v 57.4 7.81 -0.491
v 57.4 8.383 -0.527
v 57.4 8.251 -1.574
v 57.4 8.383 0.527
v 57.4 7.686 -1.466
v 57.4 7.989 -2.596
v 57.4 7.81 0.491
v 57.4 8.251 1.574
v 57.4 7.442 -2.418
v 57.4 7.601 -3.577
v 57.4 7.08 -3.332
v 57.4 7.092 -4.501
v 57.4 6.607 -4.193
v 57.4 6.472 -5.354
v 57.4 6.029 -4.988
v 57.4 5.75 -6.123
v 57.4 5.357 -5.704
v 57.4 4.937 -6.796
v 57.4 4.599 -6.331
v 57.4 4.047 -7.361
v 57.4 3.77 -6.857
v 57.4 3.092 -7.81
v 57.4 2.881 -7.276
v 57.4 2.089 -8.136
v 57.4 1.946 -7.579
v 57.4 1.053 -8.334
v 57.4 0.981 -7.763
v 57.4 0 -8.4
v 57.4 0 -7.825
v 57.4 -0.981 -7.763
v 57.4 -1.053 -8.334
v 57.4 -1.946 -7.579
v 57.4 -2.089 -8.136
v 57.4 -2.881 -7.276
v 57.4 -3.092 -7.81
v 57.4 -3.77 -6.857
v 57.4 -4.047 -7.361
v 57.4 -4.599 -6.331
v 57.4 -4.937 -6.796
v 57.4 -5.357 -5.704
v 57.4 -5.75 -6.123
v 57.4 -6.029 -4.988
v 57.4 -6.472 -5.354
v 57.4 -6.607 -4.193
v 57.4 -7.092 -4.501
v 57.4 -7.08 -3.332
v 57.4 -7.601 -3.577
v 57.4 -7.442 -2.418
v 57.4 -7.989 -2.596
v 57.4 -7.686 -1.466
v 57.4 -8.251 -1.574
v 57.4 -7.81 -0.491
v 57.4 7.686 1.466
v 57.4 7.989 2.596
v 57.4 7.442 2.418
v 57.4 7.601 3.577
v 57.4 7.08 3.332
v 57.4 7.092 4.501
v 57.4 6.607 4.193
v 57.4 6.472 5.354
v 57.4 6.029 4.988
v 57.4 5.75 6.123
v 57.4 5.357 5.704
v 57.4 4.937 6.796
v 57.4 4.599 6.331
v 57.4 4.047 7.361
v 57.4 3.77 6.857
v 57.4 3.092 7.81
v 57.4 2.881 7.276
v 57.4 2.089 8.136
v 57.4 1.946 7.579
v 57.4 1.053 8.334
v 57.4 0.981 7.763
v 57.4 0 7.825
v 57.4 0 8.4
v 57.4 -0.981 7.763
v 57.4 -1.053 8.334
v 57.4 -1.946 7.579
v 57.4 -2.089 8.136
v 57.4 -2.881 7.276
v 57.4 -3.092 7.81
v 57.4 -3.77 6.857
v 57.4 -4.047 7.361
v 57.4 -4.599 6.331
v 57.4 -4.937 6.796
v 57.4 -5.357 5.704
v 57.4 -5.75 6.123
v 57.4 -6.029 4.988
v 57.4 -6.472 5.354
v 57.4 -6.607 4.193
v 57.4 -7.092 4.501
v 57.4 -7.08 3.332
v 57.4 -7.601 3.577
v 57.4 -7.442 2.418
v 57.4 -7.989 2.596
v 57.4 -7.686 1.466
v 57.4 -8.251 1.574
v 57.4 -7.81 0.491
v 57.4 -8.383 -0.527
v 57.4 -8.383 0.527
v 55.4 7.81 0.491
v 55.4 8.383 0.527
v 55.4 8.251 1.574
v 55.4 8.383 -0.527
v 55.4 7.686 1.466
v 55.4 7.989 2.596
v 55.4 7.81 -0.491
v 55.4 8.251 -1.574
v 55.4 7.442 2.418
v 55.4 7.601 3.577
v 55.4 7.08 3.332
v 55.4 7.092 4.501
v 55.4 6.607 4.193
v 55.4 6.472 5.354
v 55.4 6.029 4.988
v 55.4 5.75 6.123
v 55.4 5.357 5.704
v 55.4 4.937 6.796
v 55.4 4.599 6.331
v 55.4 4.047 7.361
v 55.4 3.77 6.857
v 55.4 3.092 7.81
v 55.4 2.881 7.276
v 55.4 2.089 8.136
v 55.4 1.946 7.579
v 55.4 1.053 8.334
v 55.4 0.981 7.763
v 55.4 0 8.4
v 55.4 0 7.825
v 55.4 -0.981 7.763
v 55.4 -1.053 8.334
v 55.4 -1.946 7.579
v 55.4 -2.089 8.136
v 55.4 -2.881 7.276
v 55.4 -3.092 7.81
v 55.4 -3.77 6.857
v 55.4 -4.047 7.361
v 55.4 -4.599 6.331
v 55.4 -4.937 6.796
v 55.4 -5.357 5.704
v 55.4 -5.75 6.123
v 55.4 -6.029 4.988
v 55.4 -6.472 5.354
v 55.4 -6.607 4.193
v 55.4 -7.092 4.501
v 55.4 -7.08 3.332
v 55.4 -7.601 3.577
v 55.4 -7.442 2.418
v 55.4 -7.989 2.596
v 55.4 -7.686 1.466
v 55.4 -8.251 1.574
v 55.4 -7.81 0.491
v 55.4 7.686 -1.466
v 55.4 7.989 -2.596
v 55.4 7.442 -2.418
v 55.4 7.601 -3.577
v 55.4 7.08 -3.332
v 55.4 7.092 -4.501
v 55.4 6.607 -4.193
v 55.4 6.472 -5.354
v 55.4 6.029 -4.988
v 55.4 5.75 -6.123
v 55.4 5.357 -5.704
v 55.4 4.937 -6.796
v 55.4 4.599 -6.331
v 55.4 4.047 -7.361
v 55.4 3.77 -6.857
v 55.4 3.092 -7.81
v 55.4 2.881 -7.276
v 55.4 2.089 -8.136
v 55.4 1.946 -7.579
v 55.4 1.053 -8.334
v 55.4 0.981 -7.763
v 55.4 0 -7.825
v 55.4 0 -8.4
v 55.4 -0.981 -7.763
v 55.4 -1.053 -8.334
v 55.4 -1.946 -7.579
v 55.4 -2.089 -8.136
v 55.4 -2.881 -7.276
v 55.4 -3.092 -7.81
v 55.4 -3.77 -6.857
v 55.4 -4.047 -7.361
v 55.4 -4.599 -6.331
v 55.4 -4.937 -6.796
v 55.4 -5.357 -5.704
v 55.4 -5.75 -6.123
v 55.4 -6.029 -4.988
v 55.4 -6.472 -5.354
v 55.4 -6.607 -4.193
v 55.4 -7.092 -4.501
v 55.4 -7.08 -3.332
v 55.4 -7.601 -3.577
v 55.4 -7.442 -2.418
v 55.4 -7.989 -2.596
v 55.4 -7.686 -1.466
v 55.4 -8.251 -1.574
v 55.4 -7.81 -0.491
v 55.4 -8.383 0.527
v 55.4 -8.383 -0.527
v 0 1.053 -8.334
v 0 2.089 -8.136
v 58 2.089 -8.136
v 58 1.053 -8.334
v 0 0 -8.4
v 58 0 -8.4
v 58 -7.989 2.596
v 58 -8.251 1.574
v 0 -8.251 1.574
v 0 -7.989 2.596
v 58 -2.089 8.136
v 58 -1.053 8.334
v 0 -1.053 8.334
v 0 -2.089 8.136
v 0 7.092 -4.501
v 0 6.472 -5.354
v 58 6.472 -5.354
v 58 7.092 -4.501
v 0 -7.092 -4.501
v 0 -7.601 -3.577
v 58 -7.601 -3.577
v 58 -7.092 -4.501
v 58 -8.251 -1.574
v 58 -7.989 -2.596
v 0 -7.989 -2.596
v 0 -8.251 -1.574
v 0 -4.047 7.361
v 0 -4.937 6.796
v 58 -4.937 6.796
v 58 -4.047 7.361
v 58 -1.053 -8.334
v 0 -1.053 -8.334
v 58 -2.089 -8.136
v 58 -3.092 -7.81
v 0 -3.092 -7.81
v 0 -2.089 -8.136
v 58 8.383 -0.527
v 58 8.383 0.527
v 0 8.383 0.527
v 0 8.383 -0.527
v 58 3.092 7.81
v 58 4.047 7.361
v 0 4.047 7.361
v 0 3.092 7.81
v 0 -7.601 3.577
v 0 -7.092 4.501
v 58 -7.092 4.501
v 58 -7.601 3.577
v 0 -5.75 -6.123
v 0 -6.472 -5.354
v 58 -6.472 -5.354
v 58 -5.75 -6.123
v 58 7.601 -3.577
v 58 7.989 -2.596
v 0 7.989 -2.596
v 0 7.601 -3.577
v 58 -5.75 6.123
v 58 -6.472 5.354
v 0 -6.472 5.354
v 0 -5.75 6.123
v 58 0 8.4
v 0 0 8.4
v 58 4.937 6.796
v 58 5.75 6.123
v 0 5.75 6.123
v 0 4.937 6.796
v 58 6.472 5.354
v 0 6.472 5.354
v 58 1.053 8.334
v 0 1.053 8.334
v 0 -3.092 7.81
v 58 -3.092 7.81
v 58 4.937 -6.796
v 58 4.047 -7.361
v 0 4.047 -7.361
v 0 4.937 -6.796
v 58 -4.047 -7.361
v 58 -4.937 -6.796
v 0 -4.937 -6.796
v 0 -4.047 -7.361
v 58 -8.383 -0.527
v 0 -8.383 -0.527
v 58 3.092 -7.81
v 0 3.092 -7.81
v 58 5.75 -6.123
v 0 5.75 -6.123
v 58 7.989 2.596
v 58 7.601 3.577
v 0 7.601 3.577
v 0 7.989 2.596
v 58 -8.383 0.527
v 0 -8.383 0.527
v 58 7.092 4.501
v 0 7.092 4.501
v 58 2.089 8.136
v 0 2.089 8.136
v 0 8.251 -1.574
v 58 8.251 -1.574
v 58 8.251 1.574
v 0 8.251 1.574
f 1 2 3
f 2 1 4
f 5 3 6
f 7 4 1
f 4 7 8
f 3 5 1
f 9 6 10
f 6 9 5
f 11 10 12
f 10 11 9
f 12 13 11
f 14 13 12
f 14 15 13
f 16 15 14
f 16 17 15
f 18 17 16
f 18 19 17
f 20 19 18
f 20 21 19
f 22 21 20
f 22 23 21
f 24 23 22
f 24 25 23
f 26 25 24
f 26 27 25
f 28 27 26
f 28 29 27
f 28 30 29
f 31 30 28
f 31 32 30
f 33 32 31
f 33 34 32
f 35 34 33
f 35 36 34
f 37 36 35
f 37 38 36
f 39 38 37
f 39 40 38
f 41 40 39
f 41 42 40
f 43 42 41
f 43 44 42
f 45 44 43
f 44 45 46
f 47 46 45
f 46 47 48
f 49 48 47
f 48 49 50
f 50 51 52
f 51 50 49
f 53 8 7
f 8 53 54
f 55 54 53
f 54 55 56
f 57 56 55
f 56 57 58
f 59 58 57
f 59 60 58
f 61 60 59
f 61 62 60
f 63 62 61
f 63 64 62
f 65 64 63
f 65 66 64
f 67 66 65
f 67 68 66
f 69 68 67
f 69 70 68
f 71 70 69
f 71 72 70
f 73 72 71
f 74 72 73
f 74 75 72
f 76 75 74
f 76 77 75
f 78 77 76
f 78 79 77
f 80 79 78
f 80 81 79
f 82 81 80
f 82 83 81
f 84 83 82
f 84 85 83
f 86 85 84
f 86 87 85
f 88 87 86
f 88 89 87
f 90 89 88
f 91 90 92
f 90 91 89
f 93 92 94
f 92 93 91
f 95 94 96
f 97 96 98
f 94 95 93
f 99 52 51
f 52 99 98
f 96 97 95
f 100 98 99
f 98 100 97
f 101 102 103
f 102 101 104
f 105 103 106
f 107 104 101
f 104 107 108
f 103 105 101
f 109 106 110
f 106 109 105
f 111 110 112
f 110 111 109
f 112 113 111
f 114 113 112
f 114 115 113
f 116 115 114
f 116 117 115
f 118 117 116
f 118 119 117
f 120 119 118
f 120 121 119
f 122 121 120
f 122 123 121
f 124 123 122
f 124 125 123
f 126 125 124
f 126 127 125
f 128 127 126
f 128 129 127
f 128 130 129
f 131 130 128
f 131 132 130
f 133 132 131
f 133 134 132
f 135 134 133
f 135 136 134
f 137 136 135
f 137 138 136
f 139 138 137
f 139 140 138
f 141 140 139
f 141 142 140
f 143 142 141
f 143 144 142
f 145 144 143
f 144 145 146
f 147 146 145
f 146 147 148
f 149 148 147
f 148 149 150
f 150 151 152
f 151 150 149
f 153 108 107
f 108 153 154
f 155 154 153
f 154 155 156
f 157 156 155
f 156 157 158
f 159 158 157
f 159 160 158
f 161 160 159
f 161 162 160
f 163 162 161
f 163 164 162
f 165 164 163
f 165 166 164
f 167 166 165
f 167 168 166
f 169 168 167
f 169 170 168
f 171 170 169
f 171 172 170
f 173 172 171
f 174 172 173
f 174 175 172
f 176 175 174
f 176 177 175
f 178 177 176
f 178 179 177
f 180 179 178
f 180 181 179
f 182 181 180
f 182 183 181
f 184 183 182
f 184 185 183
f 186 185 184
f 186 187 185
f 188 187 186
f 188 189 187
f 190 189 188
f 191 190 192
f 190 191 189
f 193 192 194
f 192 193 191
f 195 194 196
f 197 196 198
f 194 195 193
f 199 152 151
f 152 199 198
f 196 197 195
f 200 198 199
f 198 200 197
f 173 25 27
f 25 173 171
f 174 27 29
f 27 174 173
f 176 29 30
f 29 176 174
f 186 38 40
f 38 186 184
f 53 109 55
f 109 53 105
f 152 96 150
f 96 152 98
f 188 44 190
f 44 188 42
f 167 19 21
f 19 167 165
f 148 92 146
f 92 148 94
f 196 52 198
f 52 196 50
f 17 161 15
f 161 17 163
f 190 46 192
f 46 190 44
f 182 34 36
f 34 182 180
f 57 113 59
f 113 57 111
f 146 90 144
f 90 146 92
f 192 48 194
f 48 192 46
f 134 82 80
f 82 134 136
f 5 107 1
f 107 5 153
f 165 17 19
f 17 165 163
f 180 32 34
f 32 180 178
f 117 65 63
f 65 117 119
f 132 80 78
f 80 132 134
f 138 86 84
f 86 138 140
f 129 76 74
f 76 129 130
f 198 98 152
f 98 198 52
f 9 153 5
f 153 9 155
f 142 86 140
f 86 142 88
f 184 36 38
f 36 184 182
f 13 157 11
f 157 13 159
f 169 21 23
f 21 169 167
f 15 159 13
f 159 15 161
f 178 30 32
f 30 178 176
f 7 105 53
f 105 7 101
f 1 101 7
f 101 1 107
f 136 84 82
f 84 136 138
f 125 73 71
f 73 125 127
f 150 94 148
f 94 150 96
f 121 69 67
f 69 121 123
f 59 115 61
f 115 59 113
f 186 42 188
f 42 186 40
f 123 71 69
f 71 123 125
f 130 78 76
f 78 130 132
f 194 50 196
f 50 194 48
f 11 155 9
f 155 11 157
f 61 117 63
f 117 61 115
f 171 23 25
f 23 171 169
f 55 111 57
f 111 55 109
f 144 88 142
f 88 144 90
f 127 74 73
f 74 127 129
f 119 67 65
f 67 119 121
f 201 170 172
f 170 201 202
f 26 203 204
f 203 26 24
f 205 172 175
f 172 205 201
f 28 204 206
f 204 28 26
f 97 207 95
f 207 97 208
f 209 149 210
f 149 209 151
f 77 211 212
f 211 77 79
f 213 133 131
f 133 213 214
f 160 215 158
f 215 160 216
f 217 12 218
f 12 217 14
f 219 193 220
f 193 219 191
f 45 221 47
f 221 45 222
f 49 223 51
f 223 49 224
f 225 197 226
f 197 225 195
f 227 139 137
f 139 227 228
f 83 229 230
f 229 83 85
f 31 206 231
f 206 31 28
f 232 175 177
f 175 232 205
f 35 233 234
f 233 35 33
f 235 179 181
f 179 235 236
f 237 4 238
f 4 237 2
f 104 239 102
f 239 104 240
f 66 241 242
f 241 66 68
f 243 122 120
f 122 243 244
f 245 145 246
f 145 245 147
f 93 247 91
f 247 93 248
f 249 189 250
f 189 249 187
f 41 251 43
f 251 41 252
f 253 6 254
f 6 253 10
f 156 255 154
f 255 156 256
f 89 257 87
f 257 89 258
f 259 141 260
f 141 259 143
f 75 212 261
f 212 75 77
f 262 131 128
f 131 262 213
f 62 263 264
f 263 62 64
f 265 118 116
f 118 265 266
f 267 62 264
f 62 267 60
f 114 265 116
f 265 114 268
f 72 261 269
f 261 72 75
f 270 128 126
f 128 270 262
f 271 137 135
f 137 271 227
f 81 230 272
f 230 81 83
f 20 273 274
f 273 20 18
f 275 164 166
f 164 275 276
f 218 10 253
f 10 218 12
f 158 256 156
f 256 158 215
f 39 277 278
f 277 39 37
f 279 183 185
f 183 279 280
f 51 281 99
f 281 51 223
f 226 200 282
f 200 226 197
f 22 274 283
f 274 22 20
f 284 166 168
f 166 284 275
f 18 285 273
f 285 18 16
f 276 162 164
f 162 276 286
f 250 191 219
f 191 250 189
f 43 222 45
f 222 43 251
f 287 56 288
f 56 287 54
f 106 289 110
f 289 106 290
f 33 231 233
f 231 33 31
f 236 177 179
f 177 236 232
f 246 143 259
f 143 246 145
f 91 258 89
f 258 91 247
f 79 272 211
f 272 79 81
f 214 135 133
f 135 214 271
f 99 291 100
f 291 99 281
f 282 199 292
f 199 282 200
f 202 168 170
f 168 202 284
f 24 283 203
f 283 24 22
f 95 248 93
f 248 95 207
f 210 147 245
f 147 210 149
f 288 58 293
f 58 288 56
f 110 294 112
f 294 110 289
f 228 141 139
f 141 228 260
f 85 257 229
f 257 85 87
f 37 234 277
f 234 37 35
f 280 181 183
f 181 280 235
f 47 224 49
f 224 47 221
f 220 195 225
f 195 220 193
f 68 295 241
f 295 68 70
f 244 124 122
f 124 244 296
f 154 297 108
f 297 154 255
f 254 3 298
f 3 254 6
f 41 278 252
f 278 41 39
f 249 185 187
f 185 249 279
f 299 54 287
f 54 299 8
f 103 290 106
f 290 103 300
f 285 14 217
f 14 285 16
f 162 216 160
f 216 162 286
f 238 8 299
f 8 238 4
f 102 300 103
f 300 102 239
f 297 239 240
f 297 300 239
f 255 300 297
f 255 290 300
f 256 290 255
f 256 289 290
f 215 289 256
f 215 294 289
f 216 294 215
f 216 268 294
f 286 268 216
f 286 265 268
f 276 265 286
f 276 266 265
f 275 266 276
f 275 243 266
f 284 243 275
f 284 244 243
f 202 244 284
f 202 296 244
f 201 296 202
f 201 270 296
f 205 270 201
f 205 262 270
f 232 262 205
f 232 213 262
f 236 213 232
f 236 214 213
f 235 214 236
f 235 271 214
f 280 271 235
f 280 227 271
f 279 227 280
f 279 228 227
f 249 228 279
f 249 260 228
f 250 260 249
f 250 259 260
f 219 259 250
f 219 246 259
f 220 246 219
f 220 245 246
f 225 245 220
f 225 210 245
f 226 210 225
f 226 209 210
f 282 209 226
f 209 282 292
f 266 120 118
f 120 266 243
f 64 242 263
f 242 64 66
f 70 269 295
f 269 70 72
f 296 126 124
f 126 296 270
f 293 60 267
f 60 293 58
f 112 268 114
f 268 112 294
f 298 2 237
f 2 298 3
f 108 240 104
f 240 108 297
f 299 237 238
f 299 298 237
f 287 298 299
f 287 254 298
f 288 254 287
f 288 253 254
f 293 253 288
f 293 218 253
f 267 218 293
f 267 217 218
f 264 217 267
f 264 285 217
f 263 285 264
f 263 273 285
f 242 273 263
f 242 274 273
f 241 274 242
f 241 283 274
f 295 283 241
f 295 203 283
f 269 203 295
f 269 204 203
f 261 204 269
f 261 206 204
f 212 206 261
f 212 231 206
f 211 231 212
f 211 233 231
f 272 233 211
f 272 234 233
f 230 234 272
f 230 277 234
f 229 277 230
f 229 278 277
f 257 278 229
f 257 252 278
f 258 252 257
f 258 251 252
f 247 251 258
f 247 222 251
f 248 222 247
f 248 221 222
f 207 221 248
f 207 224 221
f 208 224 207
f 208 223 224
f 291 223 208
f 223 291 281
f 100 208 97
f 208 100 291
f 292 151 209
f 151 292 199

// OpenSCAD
$fn=50;

function HotEndDiam() = 16;
function HotEndRecessDiam() = 7;
function HotEndRecessHeight() = 2;
function HotEndRecessDepth() = 1.95;
function HotEndRecessOffset() = 2.6;
function HotEndLength() = 58;

module HotEnd(ScrewChannel=false,3dPrinterTolerance=.4){
rotate([0,90,0]){
	if(ScrewChannel==false){	
		cylinder(h=HotEndLength(),r=HotEndDiam()/2+3dPrinterTolerance,center=true);
	}else{
		difference(){
			cylinder(h=HotEndLength(),r=HotEndDiam()/2+3dPrinterTolerance);
			translate([0,0,HotEndLength()-HotEndRecessOffset()]){
				difference(){
					cylinder(HotEndRecessHeight(),HotEndDiam()/2+1+3dPrinterTolerance,HotEndDiam()/2+1+3dPrinterTolerance);
					cylinder(HotEndRecessHeight(),(HotEndDiam()-HotEndRecessDepth())/2+.4+3dPrinterTolerance,(HotEndDiam()-HotEndRecessDepth())/2+.4+3dPrinterTolerance);
				}
			}
		}
	}
}
}

HotEnd(true,.4);		
